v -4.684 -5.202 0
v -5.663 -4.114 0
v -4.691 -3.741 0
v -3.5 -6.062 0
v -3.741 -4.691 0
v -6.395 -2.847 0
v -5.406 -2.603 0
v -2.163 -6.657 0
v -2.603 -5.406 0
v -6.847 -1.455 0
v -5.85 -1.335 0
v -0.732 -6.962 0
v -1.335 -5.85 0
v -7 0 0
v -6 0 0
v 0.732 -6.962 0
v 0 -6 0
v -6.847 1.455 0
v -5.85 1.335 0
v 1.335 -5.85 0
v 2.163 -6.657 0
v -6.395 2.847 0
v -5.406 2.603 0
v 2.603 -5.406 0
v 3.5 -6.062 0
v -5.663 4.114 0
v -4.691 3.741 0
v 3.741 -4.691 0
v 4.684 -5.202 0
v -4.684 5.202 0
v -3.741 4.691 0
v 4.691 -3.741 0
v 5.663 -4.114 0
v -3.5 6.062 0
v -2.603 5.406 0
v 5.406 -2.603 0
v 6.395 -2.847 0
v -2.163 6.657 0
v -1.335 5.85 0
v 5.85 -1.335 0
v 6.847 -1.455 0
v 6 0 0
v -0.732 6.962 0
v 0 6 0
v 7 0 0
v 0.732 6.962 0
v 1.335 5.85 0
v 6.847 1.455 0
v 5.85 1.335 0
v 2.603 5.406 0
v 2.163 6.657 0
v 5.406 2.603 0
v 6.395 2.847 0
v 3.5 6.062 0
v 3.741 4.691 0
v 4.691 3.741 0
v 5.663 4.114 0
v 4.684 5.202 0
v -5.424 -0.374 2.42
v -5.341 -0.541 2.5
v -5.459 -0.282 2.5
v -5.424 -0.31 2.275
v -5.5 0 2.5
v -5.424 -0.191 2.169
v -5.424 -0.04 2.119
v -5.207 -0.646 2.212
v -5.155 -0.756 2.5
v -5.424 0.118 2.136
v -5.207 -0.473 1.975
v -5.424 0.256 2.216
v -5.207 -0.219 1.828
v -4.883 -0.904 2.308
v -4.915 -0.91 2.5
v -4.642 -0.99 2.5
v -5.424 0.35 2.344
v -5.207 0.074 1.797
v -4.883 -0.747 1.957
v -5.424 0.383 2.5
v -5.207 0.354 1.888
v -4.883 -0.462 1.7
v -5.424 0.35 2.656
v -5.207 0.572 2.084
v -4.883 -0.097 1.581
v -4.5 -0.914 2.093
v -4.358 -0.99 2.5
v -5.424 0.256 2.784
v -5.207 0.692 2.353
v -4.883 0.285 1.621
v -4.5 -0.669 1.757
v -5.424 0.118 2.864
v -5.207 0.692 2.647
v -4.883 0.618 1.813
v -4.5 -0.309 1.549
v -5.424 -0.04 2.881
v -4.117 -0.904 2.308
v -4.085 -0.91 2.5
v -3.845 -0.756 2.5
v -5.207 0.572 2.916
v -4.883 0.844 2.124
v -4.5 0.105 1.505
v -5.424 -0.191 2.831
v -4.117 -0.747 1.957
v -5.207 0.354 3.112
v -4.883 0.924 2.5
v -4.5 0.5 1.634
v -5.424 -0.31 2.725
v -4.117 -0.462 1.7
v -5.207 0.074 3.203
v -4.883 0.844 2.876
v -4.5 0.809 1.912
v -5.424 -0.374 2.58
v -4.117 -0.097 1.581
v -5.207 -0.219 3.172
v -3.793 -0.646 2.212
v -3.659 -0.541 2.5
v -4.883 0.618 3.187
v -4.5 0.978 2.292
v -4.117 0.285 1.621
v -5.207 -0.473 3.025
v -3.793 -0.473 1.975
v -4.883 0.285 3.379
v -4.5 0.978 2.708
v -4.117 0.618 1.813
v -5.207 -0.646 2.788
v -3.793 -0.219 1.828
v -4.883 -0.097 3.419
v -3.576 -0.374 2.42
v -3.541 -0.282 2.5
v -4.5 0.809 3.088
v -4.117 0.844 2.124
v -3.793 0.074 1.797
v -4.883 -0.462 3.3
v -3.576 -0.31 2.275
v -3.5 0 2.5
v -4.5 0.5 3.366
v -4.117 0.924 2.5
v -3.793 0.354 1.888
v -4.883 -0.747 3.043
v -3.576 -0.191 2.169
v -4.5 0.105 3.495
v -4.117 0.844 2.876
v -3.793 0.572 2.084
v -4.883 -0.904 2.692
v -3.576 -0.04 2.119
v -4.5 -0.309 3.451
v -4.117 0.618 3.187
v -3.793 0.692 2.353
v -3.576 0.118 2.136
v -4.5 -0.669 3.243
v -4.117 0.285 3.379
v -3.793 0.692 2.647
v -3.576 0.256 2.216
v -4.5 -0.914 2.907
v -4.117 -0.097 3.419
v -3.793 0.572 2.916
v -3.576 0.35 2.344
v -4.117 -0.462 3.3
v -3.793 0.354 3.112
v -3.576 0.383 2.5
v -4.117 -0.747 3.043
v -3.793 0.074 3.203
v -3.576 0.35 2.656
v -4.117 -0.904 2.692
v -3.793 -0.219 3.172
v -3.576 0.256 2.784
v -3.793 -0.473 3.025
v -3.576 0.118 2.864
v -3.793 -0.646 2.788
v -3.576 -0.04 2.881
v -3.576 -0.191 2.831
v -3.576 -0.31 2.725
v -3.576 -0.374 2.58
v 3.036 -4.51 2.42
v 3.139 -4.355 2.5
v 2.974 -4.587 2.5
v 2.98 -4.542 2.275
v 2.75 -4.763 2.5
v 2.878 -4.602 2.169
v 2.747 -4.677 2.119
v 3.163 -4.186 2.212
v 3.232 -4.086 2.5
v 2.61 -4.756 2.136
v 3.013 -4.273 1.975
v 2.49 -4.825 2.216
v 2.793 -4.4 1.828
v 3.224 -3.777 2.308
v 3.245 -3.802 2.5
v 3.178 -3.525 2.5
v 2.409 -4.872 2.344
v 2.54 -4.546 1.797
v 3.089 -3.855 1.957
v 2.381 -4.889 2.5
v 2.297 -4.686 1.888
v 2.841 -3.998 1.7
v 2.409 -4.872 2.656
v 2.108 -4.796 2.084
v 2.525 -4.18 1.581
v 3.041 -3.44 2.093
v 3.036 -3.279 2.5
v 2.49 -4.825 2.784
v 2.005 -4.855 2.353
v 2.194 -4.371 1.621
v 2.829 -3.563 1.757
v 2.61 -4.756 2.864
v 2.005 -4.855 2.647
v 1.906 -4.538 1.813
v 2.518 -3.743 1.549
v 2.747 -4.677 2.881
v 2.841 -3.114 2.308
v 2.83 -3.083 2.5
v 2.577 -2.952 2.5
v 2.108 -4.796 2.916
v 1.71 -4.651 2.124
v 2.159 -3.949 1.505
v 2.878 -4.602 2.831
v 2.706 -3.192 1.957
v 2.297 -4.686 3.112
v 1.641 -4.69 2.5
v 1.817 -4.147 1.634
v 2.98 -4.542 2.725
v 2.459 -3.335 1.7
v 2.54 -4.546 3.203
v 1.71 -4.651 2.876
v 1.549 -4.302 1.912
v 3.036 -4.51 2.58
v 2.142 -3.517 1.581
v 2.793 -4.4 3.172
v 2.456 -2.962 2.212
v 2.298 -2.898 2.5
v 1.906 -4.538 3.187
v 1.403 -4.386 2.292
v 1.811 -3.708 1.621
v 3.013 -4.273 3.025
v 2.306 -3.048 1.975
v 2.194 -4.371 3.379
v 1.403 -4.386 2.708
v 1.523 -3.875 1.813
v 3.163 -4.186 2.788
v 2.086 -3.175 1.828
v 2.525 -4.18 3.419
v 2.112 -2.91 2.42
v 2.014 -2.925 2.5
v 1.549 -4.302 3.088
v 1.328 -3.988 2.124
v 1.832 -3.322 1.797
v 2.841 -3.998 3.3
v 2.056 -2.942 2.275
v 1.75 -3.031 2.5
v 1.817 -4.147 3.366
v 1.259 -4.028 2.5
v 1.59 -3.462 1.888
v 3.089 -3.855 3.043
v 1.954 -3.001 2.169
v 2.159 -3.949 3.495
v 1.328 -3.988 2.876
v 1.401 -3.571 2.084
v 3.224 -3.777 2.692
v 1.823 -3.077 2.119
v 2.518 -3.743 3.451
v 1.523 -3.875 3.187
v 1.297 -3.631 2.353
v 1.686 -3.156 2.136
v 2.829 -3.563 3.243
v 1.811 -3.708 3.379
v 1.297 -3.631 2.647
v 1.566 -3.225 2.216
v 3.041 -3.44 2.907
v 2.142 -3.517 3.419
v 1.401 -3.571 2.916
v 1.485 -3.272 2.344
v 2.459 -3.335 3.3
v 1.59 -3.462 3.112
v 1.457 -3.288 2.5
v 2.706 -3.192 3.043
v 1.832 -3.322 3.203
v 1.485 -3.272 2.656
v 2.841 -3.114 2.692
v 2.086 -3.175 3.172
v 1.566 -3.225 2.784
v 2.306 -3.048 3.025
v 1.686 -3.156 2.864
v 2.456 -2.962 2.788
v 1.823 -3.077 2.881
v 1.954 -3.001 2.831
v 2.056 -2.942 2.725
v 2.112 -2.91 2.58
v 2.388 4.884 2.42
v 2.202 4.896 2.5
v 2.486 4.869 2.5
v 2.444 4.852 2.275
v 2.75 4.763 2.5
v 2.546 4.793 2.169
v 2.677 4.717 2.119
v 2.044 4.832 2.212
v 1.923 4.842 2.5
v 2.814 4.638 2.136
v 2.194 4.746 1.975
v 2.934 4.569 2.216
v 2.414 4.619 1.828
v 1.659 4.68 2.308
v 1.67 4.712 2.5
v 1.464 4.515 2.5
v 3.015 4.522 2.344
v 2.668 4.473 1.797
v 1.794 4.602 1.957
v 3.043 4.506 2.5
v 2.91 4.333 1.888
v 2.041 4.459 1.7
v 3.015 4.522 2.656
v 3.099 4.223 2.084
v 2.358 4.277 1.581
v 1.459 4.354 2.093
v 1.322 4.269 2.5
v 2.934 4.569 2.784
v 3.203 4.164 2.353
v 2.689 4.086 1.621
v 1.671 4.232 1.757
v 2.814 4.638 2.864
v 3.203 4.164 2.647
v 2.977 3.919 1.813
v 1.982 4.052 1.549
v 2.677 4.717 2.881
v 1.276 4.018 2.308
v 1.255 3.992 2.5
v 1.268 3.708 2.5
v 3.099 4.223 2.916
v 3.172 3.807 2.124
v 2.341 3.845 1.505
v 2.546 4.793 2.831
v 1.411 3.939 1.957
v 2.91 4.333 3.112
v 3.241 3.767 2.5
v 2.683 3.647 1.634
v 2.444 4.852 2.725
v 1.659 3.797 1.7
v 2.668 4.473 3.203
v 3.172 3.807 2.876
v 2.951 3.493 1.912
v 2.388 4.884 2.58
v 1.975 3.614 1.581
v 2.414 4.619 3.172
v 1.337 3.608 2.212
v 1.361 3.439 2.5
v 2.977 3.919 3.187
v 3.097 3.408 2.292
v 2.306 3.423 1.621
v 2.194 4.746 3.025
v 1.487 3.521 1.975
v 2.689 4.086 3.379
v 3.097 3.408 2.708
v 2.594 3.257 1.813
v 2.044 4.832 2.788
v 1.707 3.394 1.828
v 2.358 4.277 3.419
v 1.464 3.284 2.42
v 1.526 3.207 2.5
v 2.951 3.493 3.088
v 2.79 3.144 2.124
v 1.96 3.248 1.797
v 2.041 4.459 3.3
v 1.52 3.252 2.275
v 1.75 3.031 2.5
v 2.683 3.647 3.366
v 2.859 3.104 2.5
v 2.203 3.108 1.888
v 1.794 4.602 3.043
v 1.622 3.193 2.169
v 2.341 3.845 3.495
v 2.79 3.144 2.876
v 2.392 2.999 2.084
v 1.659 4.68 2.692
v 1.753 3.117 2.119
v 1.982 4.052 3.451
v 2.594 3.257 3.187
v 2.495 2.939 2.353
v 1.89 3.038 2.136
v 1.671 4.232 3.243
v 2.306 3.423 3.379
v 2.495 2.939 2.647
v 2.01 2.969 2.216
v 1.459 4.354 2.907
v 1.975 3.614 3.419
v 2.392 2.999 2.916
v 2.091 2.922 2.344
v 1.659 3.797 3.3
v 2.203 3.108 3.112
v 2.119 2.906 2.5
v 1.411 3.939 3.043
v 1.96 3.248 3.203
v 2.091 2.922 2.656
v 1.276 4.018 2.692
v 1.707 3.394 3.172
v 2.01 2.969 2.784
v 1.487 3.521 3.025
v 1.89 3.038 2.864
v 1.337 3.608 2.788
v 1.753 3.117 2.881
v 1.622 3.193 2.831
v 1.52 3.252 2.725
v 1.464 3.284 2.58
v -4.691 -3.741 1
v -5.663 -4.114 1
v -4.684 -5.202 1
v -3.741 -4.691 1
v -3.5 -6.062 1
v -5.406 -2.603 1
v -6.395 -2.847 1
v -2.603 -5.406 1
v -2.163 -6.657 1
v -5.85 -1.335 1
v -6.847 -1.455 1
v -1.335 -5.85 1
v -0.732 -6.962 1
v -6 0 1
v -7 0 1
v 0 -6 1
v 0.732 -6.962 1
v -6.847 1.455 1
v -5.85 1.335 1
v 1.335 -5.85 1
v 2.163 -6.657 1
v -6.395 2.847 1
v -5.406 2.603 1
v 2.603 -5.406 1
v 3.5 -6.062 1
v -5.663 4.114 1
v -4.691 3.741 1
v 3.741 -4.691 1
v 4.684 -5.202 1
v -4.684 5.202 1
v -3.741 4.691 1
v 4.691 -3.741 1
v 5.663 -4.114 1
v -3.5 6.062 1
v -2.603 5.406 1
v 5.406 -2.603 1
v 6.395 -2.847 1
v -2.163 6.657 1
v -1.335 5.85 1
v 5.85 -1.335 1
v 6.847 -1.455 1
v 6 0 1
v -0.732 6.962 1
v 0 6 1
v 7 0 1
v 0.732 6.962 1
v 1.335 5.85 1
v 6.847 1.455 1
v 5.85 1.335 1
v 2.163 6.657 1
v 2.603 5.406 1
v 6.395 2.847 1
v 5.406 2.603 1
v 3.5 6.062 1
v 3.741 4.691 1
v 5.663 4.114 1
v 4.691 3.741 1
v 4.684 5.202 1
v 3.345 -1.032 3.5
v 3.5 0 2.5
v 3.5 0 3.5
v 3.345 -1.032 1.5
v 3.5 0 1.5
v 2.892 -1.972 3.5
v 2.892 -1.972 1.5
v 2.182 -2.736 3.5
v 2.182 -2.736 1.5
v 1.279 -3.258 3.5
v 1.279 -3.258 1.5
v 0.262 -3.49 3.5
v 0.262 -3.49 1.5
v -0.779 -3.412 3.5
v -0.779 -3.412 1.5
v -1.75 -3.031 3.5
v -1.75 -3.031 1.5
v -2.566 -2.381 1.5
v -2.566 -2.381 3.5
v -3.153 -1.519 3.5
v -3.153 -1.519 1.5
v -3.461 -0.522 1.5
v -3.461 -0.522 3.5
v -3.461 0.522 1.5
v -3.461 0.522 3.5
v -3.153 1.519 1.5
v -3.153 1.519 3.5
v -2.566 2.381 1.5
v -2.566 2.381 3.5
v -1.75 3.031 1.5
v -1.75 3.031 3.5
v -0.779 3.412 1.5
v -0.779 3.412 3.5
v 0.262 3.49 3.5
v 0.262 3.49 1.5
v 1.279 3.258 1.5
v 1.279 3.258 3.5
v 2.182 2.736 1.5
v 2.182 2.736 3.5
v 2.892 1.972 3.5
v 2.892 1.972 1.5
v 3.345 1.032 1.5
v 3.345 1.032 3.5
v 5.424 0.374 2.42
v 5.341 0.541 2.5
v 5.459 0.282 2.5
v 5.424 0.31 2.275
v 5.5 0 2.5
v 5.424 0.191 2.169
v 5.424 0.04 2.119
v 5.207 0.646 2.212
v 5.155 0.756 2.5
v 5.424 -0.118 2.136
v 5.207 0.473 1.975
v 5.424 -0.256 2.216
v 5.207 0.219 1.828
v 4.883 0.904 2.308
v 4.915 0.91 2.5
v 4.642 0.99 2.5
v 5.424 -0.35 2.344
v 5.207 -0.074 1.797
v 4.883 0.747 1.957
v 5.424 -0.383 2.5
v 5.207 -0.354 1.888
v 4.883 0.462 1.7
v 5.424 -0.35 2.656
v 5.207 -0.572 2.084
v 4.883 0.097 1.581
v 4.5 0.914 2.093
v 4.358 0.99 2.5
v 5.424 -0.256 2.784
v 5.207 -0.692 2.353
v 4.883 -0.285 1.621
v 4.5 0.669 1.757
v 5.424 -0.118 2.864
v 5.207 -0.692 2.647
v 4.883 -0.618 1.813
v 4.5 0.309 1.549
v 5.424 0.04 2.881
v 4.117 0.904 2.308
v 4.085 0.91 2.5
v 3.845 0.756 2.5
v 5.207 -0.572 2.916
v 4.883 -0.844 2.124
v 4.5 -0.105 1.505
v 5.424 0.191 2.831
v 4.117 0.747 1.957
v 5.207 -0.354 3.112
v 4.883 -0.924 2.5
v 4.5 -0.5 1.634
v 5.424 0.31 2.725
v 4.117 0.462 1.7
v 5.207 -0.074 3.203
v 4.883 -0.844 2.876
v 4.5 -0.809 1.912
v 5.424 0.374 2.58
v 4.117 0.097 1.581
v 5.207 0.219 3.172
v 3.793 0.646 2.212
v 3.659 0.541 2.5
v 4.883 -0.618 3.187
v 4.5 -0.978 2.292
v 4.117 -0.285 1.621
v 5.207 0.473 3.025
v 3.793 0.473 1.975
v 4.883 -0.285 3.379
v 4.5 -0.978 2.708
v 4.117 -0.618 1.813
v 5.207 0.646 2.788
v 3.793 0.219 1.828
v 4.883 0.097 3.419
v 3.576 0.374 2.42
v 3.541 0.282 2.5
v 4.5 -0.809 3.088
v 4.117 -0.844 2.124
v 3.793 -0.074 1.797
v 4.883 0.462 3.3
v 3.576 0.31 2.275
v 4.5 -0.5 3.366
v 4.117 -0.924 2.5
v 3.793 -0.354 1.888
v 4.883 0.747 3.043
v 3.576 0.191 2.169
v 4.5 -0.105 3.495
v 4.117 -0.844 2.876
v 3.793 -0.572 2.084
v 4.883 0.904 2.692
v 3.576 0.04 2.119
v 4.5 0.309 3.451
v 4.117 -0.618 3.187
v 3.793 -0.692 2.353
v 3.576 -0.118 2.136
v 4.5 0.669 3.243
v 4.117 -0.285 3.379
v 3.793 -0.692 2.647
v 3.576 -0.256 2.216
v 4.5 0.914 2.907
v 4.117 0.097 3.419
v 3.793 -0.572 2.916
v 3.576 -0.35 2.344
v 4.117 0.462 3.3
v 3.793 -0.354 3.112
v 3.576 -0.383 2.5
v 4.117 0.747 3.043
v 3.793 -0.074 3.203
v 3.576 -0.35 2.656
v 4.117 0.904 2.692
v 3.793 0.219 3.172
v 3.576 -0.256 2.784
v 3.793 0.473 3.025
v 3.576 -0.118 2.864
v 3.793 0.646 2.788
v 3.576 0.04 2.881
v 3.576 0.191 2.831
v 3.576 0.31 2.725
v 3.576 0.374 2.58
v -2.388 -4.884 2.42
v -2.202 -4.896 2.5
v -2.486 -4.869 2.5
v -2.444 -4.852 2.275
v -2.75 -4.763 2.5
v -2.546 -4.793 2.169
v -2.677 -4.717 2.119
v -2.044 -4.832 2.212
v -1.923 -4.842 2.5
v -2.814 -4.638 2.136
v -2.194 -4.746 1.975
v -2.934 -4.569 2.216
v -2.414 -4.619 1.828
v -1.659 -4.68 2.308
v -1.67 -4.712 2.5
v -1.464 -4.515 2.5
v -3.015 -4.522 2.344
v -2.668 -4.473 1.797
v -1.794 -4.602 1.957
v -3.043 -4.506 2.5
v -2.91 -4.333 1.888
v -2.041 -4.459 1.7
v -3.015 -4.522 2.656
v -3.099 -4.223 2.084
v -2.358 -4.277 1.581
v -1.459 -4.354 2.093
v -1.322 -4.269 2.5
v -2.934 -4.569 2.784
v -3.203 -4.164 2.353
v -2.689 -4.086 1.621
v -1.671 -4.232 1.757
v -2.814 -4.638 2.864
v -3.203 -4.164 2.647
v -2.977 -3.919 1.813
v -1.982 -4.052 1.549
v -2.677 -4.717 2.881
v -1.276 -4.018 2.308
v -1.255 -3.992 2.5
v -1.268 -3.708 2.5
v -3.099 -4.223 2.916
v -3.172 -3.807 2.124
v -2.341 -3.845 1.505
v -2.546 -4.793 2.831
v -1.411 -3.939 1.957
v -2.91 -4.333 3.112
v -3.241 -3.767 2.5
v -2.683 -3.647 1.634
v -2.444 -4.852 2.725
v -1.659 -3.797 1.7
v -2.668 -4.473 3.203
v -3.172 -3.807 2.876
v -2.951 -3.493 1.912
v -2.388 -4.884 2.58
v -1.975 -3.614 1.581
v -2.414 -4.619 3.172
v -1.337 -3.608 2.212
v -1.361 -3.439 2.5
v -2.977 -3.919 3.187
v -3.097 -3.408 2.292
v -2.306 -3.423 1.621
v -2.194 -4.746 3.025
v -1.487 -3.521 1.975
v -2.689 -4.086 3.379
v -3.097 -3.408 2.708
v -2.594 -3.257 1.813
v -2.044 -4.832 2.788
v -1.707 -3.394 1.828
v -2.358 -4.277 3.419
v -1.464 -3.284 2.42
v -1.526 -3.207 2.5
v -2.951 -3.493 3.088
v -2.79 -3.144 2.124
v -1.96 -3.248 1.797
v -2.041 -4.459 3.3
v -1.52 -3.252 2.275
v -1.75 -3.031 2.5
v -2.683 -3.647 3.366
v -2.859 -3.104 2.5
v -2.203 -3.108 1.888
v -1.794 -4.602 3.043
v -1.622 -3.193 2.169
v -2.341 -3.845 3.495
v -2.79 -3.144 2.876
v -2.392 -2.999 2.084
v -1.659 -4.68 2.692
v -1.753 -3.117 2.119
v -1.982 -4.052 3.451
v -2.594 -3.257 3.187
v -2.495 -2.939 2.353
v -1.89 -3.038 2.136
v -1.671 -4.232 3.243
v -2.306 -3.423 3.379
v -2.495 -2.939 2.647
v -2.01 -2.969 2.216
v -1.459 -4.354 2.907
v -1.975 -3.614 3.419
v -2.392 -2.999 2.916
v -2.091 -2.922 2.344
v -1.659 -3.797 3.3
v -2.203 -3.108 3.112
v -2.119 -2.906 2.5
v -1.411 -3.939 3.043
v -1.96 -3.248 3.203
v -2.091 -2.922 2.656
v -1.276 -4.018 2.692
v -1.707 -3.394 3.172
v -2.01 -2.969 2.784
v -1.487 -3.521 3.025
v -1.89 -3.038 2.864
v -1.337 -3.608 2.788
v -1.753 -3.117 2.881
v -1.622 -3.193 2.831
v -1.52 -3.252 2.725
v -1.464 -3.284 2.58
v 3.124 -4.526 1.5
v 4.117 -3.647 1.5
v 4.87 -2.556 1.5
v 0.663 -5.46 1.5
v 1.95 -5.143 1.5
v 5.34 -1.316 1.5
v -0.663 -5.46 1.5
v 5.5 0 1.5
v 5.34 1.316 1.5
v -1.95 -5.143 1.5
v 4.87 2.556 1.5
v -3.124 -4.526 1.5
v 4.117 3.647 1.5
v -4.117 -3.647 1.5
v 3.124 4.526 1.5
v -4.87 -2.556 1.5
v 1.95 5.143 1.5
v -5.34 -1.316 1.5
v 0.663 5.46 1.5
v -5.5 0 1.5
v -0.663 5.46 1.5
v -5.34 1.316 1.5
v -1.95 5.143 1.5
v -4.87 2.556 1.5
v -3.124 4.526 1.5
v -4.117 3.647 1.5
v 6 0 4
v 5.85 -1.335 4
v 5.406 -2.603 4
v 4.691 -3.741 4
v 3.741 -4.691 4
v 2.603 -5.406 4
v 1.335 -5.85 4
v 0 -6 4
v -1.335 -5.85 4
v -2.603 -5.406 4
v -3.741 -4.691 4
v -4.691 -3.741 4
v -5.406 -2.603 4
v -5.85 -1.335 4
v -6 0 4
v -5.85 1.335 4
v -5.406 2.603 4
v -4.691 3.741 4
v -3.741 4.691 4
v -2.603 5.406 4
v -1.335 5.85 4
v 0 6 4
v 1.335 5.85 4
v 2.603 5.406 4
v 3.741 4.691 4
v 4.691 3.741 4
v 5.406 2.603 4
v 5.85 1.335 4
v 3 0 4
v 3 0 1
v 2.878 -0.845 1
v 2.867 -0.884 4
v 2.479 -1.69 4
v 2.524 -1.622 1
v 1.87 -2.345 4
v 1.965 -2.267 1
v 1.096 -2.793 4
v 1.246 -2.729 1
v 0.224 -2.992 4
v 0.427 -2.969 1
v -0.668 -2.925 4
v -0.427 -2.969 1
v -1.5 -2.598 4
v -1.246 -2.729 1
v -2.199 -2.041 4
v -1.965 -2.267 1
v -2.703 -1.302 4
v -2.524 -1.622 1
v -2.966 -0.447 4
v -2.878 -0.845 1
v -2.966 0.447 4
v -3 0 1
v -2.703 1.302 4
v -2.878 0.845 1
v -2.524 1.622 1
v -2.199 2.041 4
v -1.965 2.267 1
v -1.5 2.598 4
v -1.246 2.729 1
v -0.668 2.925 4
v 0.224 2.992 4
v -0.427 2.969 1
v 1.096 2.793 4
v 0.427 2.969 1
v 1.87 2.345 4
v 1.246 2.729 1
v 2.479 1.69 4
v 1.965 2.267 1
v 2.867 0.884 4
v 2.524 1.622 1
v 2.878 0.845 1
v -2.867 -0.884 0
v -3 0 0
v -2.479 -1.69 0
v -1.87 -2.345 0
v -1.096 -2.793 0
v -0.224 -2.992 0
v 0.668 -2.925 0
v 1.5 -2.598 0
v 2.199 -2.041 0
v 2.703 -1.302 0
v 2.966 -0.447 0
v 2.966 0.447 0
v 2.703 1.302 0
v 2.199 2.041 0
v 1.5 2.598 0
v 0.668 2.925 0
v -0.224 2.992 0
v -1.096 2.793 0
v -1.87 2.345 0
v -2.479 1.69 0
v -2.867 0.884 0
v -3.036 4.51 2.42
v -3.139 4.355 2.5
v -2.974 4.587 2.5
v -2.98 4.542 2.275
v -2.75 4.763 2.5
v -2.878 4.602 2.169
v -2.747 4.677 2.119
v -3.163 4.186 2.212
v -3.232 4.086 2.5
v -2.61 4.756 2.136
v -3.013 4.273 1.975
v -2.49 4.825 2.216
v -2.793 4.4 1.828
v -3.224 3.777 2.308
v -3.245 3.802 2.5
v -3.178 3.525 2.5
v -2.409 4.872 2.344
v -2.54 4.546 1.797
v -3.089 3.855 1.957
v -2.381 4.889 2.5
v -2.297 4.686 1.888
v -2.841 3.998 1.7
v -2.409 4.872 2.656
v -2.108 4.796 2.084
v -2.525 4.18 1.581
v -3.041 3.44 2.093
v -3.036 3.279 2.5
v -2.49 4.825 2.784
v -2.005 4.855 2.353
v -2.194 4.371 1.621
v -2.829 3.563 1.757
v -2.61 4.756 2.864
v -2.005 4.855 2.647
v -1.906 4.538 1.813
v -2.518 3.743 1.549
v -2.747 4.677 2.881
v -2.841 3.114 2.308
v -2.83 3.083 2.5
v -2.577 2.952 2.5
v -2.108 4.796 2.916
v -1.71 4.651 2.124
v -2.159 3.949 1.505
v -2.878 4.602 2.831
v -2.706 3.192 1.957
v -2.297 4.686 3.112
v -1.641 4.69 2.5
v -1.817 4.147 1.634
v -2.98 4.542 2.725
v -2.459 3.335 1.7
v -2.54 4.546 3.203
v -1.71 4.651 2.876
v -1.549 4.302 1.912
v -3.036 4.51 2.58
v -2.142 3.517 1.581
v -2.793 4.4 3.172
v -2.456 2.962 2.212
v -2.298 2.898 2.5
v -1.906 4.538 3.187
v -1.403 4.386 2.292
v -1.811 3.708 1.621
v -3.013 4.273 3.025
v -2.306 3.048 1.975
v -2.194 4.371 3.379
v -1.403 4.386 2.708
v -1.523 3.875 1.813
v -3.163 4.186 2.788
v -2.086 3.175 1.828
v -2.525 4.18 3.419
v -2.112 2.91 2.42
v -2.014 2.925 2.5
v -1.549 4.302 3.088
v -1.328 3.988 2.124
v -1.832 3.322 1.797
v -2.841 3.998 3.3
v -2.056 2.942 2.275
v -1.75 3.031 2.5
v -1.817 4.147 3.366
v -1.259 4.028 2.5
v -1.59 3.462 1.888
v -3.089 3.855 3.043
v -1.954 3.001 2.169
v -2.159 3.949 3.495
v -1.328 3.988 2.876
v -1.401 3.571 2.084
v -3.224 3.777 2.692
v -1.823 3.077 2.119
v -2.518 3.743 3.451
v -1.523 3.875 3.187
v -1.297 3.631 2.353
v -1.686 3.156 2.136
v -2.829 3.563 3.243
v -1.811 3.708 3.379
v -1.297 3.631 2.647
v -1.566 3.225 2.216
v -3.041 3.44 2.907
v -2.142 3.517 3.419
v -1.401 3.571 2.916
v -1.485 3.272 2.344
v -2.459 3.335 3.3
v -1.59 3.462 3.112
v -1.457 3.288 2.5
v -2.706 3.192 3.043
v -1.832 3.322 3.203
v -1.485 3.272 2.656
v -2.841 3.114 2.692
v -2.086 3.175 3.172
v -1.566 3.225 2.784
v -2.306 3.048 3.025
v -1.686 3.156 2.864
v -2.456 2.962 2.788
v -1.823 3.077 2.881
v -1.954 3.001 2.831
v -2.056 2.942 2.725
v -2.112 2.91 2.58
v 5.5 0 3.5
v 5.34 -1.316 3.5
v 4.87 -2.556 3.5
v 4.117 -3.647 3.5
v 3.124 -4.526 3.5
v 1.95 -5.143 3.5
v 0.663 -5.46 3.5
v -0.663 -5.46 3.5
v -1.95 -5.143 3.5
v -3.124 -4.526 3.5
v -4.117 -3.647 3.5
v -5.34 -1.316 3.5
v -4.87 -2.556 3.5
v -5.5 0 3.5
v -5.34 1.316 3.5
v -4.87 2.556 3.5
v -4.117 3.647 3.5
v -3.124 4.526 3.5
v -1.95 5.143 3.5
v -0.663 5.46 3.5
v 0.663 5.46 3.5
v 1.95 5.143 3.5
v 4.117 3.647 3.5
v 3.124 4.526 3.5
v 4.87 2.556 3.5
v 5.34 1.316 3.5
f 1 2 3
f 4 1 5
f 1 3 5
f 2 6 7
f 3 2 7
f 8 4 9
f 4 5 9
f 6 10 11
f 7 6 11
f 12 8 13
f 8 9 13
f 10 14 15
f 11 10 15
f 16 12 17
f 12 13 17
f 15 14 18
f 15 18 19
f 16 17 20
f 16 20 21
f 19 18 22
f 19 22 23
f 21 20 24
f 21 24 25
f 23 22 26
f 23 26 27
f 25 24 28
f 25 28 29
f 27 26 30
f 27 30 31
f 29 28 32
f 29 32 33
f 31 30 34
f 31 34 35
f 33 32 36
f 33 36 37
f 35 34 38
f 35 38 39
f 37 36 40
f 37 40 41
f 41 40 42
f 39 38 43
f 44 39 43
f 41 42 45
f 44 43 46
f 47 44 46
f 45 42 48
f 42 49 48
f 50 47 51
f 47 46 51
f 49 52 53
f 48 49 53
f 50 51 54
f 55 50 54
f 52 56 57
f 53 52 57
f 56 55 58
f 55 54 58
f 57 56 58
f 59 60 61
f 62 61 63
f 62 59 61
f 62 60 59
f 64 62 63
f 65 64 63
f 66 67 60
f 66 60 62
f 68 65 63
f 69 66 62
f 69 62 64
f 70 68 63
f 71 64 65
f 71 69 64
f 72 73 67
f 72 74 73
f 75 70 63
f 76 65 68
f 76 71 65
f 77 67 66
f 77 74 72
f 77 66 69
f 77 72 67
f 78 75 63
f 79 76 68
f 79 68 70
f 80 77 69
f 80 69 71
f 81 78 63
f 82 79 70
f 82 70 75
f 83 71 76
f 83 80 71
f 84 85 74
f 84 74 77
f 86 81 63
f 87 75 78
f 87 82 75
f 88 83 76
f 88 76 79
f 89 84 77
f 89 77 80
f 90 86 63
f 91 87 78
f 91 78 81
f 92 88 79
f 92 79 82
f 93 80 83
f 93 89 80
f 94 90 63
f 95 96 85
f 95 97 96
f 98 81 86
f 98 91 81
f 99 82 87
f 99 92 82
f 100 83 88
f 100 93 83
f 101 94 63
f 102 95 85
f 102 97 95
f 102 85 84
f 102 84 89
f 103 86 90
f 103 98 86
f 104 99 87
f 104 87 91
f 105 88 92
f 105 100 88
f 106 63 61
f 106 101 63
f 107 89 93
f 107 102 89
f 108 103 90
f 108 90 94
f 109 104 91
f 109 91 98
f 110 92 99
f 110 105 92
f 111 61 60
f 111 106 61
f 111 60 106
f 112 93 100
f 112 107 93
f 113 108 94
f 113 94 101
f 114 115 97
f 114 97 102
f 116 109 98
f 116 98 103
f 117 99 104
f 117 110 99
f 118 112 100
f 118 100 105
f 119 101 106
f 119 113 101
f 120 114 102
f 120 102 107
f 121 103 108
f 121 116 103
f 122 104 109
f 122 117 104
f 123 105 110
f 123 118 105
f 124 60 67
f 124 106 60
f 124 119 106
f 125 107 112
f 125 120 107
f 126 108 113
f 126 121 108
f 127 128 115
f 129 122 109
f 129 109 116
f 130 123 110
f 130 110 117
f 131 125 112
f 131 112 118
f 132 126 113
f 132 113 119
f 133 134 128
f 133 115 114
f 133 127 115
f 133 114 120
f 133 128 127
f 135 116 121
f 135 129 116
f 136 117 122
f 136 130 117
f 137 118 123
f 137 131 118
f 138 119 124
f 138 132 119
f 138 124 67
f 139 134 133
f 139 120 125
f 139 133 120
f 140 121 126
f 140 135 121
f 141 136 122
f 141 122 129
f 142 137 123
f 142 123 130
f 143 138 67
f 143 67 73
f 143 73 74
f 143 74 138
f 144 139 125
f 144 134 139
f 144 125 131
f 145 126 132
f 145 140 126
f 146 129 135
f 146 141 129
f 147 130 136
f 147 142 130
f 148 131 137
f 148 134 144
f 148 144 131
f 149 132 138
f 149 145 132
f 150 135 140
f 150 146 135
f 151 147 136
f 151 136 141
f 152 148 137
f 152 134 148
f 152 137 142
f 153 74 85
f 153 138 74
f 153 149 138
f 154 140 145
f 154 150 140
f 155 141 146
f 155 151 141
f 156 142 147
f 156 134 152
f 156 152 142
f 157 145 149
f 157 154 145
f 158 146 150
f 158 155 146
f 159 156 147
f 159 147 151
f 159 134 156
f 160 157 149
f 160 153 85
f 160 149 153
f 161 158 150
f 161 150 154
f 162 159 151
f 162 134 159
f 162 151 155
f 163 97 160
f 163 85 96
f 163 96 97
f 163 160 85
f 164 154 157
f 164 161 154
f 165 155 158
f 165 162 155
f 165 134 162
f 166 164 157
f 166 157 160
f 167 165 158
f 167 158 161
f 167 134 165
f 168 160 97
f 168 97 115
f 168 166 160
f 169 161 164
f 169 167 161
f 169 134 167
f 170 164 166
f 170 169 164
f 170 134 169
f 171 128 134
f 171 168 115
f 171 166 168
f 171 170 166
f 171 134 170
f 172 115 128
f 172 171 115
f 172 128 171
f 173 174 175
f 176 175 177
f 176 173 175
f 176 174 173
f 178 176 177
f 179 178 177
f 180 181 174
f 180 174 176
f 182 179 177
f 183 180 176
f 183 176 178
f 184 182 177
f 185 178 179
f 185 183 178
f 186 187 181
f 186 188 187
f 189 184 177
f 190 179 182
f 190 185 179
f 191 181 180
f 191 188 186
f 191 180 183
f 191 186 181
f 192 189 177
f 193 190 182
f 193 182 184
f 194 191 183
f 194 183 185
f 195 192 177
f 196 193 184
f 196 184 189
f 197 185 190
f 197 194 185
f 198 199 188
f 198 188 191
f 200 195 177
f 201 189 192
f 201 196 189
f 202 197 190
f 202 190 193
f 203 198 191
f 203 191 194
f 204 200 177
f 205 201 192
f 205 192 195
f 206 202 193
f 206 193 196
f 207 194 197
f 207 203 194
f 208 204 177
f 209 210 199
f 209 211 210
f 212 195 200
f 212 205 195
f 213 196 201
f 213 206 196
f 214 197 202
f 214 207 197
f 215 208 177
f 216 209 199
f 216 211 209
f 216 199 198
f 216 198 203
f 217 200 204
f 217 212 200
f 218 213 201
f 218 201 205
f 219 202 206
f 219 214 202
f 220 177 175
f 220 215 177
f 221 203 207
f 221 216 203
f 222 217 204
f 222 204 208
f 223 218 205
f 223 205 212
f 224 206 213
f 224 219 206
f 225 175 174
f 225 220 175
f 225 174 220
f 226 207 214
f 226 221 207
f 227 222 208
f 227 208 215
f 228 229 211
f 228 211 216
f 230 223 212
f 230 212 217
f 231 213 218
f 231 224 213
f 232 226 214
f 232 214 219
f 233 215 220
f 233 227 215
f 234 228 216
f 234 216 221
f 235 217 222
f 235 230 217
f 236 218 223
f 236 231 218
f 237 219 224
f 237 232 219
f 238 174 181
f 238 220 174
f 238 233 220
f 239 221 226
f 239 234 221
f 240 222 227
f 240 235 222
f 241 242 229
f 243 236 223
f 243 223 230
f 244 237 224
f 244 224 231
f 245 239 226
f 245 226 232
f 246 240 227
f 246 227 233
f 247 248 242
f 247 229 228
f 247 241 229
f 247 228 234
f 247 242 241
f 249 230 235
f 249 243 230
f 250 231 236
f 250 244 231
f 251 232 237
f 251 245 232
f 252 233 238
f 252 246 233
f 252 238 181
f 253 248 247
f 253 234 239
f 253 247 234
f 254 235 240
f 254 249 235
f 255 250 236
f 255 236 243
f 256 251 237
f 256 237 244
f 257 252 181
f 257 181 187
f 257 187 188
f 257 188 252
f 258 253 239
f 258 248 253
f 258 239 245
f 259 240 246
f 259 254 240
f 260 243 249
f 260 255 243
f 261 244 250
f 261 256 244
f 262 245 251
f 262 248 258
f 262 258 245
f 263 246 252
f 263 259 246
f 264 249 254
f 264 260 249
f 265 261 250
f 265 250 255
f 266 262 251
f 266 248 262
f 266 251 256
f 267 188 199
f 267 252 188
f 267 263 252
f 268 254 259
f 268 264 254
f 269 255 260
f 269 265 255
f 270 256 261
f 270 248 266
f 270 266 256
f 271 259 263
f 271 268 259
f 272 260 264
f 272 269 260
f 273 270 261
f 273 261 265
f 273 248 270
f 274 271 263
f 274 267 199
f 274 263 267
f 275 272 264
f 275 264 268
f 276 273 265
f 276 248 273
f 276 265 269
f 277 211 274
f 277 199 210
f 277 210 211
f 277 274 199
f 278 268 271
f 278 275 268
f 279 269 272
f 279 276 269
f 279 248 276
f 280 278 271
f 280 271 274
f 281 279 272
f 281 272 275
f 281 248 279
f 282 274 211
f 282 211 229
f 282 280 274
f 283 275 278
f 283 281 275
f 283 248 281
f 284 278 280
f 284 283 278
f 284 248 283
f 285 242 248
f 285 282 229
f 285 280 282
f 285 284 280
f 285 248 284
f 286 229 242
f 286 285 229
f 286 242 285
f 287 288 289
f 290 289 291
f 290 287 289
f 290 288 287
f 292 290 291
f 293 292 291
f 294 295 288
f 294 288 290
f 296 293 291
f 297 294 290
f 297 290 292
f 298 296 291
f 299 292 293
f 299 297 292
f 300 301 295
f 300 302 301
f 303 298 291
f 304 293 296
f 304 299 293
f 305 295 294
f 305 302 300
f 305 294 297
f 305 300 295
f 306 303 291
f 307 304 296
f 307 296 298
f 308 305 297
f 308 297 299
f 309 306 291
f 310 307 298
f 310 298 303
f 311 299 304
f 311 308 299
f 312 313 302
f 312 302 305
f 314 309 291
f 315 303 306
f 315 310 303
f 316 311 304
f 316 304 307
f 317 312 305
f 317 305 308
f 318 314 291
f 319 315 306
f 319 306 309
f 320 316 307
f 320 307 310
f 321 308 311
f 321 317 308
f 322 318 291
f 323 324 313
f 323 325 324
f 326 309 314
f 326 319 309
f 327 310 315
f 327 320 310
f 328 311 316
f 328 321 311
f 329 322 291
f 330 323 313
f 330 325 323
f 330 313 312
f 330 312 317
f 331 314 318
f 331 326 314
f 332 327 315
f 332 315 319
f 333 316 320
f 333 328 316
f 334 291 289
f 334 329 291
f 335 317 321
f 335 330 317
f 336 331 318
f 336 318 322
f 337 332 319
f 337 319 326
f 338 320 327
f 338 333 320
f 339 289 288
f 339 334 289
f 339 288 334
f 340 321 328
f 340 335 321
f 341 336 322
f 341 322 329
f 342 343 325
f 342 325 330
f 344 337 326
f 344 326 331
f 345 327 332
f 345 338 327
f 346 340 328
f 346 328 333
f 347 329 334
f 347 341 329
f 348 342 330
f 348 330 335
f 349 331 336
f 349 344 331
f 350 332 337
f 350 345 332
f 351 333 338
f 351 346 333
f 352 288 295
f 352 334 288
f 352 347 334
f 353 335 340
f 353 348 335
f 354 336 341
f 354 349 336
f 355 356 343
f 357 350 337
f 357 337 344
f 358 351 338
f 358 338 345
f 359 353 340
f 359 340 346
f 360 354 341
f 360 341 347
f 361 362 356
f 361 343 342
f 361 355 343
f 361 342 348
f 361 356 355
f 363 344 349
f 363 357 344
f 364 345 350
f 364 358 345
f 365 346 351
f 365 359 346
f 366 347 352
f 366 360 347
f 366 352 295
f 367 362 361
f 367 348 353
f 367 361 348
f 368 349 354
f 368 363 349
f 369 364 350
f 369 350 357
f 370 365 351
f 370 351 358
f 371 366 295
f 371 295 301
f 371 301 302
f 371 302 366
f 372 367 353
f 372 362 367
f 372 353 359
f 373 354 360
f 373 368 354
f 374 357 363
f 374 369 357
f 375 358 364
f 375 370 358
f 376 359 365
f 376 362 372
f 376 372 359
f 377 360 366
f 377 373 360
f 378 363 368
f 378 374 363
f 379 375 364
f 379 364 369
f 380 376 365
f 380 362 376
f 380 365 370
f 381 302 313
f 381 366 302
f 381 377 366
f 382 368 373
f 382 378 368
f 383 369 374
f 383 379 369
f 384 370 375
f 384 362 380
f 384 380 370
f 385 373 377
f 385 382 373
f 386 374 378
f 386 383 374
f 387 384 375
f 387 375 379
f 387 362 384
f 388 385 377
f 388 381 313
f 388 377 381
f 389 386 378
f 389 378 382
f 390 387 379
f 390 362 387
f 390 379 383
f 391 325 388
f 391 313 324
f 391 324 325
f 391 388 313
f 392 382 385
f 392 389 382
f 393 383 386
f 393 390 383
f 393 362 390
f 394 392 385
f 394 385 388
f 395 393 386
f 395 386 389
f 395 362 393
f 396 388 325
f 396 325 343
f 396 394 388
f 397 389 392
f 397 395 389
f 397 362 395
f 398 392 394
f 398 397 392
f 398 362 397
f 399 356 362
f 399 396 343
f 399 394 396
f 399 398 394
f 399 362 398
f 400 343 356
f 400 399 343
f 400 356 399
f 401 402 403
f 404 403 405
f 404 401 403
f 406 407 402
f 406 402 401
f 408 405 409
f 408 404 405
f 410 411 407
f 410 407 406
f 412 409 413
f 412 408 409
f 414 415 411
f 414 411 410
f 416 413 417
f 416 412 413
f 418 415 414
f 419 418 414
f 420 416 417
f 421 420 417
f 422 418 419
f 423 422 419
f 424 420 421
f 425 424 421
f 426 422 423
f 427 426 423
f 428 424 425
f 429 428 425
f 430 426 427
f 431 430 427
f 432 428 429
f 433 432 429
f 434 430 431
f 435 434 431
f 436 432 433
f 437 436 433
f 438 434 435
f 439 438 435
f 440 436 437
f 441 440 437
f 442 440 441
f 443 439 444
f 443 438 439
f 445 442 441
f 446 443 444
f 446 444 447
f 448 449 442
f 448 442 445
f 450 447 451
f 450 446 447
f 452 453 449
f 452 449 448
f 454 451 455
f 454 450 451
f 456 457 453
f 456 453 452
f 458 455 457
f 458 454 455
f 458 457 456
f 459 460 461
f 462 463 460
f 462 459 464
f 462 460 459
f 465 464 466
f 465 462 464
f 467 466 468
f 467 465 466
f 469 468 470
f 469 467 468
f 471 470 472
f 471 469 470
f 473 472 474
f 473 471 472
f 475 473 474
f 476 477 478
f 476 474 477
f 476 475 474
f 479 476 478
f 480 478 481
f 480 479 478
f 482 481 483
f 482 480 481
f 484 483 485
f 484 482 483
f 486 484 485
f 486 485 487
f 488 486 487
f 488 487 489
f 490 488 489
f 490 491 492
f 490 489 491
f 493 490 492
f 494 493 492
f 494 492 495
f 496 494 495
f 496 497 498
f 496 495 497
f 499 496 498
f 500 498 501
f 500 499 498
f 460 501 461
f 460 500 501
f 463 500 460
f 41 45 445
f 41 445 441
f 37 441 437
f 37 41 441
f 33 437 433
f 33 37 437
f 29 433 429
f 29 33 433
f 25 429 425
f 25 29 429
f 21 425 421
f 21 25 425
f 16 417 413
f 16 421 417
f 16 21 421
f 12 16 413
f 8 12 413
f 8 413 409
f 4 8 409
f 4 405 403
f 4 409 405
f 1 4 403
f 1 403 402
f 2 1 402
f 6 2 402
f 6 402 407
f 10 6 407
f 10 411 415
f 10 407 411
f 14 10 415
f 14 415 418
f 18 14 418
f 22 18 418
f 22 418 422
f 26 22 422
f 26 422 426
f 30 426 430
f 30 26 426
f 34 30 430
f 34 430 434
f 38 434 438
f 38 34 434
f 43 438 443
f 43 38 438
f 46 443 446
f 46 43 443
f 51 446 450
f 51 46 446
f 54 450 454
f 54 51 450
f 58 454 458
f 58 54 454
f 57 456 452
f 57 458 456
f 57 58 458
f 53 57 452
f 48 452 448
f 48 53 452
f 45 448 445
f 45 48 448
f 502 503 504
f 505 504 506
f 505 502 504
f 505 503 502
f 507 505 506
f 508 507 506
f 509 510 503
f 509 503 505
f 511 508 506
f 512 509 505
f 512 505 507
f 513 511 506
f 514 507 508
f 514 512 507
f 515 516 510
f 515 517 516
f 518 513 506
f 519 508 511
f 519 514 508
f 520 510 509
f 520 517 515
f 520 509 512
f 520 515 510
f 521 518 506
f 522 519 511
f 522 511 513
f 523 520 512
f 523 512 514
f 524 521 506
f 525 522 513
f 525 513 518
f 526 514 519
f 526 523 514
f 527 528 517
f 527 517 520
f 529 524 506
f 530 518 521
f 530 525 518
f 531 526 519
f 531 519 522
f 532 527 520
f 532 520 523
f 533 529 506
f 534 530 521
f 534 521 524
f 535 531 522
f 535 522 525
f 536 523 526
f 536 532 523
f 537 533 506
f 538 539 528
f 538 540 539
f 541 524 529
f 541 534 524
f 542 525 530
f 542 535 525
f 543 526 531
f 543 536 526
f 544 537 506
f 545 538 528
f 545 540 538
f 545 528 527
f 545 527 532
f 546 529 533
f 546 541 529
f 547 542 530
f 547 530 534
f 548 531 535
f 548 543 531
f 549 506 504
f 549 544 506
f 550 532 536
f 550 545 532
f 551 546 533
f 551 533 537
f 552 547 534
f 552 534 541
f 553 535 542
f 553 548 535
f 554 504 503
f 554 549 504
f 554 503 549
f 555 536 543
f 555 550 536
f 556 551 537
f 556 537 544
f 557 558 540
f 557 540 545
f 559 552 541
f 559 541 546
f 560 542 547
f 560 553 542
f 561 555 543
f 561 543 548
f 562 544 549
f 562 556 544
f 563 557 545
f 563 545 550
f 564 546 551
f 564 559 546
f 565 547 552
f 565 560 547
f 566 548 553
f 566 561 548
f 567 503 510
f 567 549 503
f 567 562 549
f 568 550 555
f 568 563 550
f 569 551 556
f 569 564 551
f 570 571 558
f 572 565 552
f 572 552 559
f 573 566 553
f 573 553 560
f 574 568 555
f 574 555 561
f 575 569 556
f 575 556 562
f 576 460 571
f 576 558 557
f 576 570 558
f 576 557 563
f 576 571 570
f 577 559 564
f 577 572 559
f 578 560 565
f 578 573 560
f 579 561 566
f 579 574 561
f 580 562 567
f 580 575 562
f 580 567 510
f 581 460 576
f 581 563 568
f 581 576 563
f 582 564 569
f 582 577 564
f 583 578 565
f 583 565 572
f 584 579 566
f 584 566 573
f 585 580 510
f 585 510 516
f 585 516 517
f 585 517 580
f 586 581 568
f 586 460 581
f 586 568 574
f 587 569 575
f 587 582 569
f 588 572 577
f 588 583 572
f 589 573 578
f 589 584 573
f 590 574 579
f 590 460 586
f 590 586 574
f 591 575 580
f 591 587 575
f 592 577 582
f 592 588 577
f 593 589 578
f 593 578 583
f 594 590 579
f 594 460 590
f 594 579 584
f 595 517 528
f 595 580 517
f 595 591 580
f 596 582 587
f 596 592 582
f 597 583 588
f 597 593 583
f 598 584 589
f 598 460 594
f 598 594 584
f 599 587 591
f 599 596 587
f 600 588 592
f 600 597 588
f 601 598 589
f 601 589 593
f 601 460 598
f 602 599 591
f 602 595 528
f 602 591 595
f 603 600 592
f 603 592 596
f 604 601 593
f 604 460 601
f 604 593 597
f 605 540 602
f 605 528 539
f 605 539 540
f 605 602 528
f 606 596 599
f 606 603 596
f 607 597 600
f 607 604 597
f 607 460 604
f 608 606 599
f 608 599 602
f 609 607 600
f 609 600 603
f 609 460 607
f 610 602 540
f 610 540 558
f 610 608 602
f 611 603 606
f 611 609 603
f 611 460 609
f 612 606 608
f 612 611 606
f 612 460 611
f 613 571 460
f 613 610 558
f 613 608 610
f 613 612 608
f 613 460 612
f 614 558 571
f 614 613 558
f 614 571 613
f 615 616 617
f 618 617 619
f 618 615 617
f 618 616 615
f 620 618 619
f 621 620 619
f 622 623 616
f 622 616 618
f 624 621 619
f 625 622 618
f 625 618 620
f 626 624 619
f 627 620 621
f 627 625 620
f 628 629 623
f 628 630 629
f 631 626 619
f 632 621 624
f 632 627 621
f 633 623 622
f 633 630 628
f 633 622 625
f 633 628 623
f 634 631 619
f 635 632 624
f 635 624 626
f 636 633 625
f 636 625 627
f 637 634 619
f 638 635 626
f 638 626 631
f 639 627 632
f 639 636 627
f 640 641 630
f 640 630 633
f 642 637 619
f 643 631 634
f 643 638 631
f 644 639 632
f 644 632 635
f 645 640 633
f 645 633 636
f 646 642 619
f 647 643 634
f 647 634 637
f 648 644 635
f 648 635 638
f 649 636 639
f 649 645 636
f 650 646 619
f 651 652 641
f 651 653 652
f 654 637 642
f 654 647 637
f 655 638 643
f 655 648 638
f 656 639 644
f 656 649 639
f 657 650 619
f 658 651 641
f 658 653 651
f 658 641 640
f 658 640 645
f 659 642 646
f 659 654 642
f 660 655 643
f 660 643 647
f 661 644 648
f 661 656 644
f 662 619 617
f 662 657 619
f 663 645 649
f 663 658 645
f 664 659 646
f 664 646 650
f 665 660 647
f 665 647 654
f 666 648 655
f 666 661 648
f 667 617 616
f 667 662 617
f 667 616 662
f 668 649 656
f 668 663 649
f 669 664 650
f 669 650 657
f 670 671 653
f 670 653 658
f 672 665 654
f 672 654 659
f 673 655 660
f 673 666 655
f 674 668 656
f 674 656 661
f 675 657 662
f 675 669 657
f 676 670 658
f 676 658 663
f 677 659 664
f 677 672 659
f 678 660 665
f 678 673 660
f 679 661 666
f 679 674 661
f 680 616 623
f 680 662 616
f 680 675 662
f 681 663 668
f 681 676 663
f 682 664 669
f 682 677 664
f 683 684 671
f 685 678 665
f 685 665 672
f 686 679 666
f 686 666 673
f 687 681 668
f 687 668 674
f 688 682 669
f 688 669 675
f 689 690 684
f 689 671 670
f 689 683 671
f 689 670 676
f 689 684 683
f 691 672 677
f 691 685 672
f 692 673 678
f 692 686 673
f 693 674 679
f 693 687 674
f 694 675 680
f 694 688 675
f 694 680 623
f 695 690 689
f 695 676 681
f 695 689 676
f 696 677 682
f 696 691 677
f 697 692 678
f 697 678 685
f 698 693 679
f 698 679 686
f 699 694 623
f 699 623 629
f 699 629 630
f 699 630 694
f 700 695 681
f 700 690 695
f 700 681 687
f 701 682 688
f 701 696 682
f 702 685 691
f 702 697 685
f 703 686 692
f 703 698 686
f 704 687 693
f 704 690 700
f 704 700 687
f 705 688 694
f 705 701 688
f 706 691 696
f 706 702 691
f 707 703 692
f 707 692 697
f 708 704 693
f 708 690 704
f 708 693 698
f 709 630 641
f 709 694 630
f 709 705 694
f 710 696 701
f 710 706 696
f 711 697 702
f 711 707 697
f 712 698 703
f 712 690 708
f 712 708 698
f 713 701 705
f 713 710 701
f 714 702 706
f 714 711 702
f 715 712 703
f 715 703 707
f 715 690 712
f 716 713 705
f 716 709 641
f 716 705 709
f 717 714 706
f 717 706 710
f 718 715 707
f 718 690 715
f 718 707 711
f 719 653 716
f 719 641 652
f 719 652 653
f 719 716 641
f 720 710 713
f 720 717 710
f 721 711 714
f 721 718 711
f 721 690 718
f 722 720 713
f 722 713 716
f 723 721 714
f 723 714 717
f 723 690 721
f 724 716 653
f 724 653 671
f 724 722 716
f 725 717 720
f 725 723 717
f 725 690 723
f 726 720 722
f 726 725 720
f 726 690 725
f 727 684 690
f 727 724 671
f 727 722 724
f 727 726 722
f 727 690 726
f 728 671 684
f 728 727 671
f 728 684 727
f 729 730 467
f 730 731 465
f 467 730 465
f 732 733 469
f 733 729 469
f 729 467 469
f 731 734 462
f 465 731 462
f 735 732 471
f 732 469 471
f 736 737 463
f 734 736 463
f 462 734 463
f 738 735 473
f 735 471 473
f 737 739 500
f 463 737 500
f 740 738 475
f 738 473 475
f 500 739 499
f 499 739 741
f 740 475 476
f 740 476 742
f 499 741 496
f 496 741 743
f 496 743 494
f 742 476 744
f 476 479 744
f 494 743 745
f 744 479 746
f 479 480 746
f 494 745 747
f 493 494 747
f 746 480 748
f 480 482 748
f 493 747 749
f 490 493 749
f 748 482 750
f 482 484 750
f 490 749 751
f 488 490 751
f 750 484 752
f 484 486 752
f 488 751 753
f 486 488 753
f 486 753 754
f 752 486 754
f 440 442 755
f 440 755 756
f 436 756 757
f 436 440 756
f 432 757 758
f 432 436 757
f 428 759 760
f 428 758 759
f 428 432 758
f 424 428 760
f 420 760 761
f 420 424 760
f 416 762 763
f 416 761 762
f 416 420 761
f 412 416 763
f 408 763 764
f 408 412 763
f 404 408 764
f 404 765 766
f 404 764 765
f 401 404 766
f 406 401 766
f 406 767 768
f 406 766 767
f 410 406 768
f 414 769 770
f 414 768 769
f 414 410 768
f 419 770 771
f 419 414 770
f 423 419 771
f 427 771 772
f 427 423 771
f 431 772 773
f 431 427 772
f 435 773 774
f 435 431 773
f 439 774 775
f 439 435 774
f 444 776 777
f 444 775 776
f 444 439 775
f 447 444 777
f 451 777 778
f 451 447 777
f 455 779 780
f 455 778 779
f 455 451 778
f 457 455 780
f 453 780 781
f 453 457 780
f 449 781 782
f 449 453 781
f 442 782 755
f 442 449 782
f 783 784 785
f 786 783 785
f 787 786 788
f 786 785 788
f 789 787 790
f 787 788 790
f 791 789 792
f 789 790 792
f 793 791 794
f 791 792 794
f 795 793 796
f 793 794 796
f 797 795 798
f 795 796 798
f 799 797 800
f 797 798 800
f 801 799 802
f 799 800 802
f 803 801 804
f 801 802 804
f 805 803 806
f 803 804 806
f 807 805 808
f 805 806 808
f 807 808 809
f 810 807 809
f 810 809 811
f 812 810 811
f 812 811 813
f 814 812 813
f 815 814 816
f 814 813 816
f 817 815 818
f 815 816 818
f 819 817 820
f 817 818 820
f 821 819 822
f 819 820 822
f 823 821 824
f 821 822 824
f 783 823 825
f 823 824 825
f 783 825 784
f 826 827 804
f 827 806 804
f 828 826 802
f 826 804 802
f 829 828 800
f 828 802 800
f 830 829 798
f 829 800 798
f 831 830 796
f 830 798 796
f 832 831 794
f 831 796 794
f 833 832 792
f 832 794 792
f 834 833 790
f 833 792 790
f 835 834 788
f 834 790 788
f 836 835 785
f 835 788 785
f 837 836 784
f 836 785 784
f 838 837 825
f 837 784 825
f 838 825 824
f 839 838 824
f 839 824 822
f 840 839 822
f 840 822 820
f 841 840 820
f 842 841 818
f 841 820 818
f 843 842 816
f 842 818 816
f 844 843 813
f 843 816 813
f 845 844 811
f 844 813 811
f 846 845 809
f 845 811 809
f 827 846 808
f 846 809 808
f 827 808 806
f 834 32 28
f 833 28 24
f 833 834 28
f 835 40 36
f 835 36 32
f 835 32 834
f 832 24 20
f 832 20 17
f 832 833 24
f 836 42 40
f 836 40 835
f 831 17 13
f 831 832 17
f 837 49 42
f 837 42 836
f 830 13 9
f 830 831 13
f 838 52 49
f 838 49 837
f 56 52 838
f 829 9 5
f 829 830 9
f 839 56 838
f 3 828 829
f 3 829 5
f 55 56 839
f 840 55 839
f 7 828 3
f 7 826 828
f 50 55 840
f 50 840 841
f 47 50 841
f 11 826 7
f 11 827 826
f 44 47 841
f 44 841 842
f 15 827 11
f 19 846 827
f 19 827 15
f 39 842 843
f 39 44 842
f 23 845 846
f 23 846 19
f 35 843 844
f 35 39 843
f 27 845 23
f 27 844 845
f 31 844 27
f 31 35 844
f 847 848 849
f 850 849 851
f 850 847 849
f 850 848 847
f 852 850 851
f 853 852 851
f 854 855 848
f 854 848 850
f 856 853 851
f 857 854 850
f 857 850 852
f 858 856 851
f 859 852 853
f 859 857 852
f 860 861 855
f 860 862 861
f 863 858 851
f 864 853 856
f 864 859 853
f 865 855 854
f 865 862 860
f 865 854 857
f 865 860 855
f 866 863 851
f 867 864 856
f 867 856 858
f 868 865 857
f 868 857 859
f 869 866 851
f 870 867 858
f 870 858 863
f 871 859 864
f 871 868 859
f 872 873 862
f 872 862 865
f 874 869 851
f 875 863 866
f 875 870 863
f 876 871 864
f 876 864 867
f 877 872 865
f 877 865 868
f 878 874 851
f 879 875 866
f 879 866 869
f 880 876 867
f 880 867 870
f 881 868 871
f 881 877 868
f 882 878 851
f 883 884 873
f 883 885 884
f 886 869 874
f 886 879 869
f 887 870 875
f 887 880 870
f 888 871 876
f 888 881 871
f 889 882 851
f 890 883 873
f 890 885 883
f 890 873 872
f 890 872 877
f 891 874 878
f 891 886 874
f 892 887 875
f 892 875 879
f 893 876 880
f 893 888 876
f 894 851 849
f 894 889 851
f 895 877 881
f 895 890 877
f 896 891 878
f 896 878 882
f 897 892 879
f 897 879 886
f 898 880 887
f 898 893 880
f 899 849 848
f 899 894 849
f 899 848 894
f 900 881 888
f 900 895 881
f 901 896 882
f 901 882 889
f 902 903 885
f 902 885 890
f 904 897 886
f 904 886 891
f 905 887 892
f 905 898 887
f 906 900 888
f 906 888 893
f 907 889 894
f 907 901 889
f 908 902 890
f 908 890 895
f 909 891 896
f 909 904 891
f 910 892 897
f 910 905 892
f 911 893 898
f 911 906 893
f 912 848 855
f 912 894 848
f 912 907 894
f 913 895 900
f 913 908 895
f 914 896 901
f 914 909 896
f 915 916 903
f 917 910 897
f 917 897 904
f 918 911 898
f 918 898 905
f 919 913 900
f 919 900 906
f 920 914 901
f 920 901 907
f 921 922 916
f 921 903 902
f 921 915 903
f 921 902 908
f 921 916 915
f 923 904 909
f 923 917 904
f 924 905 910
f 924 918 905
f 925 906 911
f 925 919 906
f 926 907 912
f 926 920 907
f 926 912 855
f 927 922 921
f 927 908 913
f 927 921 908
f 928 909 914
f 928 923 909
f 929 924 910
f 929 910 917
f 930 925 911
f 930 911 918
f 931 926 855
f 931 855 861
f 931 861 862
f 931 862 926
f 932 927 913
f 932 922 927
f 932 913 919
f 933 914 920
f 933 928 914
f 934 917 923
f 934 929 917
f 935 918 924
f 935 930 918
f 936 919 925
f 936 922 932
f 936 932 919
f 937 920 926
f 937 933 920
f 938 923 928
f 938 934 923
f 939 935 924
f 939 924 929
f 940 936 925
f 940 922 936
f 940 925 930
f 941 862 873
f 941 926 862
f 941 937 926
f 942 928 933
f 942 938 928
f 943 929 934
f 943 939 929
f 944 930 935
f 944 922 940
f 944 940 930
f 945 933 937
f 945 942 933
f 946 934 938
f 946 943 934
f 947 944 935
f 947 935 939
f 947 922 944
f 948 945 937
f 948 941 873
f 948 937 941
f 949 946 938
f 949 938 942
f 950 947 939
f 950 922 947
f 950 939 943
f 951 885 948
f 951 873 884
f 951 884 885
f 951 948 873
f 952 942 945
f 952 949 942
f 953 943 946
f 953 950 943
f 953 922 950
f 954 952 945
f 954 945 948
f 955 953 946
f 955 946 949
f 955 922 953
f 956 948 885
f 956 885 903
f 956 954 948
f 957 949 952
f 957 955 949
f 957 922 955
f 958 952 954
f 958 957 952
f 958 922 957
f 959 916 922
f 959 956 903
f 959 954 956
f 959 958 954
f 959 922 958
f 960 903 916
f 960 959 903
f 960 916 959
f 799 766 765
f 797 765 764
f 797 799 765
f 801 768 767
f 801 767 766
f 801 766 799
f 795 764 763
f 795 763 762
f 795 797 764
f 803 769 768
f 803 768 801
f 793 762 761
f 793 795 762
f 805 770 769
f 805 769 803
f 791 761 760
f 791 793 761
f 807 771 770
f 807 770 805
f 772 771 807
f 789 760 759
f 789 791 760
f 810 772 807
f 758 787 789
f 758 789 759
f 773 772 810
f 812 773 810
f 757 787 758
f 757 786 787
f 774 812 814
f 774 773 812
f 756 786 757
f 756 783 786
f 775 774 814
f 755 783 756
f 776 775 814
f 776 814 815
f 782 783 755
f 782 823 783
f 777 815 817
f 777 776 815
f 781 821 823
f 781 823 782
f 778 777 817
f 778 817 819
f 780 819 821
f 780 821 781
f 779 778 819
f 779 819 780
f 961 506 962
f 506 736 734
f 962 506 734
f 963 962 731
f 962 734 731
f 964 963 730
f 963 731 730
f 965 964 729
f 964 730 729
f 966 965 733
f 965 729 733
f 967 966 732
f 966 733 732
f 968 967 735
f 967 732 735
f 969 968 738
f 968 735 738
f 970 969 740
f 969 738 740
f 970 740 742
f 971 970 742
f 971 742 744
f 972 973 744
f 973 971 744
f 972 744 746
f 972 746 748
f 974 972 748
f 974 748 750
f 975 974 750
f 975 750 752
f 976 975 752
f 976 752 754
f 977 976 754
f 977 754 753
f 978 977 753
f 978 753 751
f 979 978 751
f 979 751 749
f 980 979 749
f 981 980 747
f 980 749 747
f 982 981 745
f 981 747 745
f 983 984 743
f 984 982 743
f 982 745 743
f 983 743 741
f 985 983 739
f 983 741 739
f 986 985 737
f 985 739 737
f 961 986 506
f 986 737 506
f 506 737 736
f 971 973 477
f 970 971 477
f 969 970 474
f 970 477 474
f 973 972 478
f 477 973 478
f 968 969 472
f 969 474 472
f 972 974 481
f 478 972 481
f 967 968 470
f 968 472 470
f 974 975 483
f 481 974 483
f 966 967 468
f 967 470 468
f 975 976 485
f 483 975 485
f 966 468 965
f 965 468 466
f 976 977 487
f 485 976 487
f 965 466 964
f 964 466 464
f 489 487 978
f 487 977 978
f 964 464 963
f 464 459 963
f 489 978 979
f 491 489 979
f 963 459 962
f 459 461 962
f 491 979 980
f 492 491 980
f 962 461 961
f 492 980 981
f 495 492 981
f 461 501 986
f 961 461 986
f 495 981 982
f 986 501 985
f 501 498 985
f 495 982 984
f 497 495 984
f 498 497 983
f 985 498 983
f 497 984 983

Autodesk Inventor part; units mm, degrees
sketch "スケッチ1" plane through (0, 0, 0) normal (0, 0, 1) x (1, 0, 0)
  circle A0 centre (0, 0) radius 7
  circle A1 centre (0, 0) radius 6
  dimension "d0" = 14
  dimension "d1" = 12
extrude "押し出し1" add sketch "スケッチ1" along normal blind 1
sketch "スケッチ2" plane through (0, 0, 1) normal (0, 0, 1) x (1, 0, 0)
  circle A0 centre (0, 0) radius 5.5
  circle A1 centre (0, 0) radius 3
  circle A2 centre (0, 0) radius 5
  circle A3 centre (0, 0) radius 3.5
  circle A4 centre (0, 0) radius 7 projected
  circle A5 centre (0, 0) radius 7 projected
  circle A6 centre (0, 0) radius 6 projected
  dimension "d4" = 11
  dimension "d5" = 6
  dimension "d6" = 10
  dimension "d7" = 7
extrude "押し出し2" add sketch "スケッチ2" along normal blind 3 contours A3 | A6
ref_plane "作業平面1" through (0, 0, 2.5) normal (0, 0, 1) x (1, 0, 0)
sketch "スケッチ3" plane through (0, 0, 2.5) normal (0, 0, 1) x (1, 0, 0)
  circle A0 centre (0, 0) radius 6 projected
  circle A1 centre (0, 0) radius 5.5 projected
  circle A2 centre (0, 0) radius 3.5 projected
  circle A3 centre (0, 0) radius 3 projected
  circle A4 centre (4.5, 0) radius 1
  circle A5 centre (0, 0) radius 5.5 projected
  circle A6 centre (0, 0) radius 3.5 projected
  circle A7 centre (0, 0) radius 5.5 projected
  line L0 (5.5, 0) -> (3.5, 0)
  circle A8 centre (0, 0) radius 3.5 projected
  dimension "d15" = 2
revolve "回転1" add sketch "スケッチ3" angle 360 about axis through (5.5, 0, 2.5) along (-1, 0, 0) picked at (4.7952, 0.1549) contours L0 A4
pattern_circular "円形状パターン1" count 6 over 360 about axis through (0, 0, -10) along (0, 0, 1) of "回転1"
ref_plane "作業平面2" through (0, 0, 3.5) normal (0, 0, 1) x (1, 0, 0)
ref_plane "作業平面3" through (0, 0, 1.5) normal (0, 0, -1) x (-1, 0, 0)
sketch "スケッチ4" plane through (0, 0, 1.5) normal (0, 0, -1) x (-1, 0, 0)
  circle A0 centre (0, 0) radius 3.5 projected
  circle A1 centre (0, 0) radius 3 projected
  circle A2 centre (0, 0) radius 6 projected
  circle A3 centre (0, 0) radius 5.5 projected
extrude "押し出し3" add sketch "スケッチ4" along normal blind 0.5 contours A3
sketch "スケッチ5" plane through (0, 0, 3.5) normal (0, 0, 1) x (1, 0, 0)
  circle A0 centre (0, 0) radius 5.5 projected
  circle A1 centre (0, 0) radius 3.5 projected
extrude "押し出し4" add sketch "スケッチ5" along normal blind 0.5
sketch "スケッチ6" plane through (0, 0, 1) normal (0, 0, -1) x (-1, 0, 0)
  circle A0 centre (0, 0) radius 6 projected
  circle A1 centre (0, 0) radius 3 projected
extrude "押し出し5" add sketch "スケッチ6" along normal blind 1
properties part number "φ6φ12ベアリングa" material "鋼 AISI 1006 85 HR"
